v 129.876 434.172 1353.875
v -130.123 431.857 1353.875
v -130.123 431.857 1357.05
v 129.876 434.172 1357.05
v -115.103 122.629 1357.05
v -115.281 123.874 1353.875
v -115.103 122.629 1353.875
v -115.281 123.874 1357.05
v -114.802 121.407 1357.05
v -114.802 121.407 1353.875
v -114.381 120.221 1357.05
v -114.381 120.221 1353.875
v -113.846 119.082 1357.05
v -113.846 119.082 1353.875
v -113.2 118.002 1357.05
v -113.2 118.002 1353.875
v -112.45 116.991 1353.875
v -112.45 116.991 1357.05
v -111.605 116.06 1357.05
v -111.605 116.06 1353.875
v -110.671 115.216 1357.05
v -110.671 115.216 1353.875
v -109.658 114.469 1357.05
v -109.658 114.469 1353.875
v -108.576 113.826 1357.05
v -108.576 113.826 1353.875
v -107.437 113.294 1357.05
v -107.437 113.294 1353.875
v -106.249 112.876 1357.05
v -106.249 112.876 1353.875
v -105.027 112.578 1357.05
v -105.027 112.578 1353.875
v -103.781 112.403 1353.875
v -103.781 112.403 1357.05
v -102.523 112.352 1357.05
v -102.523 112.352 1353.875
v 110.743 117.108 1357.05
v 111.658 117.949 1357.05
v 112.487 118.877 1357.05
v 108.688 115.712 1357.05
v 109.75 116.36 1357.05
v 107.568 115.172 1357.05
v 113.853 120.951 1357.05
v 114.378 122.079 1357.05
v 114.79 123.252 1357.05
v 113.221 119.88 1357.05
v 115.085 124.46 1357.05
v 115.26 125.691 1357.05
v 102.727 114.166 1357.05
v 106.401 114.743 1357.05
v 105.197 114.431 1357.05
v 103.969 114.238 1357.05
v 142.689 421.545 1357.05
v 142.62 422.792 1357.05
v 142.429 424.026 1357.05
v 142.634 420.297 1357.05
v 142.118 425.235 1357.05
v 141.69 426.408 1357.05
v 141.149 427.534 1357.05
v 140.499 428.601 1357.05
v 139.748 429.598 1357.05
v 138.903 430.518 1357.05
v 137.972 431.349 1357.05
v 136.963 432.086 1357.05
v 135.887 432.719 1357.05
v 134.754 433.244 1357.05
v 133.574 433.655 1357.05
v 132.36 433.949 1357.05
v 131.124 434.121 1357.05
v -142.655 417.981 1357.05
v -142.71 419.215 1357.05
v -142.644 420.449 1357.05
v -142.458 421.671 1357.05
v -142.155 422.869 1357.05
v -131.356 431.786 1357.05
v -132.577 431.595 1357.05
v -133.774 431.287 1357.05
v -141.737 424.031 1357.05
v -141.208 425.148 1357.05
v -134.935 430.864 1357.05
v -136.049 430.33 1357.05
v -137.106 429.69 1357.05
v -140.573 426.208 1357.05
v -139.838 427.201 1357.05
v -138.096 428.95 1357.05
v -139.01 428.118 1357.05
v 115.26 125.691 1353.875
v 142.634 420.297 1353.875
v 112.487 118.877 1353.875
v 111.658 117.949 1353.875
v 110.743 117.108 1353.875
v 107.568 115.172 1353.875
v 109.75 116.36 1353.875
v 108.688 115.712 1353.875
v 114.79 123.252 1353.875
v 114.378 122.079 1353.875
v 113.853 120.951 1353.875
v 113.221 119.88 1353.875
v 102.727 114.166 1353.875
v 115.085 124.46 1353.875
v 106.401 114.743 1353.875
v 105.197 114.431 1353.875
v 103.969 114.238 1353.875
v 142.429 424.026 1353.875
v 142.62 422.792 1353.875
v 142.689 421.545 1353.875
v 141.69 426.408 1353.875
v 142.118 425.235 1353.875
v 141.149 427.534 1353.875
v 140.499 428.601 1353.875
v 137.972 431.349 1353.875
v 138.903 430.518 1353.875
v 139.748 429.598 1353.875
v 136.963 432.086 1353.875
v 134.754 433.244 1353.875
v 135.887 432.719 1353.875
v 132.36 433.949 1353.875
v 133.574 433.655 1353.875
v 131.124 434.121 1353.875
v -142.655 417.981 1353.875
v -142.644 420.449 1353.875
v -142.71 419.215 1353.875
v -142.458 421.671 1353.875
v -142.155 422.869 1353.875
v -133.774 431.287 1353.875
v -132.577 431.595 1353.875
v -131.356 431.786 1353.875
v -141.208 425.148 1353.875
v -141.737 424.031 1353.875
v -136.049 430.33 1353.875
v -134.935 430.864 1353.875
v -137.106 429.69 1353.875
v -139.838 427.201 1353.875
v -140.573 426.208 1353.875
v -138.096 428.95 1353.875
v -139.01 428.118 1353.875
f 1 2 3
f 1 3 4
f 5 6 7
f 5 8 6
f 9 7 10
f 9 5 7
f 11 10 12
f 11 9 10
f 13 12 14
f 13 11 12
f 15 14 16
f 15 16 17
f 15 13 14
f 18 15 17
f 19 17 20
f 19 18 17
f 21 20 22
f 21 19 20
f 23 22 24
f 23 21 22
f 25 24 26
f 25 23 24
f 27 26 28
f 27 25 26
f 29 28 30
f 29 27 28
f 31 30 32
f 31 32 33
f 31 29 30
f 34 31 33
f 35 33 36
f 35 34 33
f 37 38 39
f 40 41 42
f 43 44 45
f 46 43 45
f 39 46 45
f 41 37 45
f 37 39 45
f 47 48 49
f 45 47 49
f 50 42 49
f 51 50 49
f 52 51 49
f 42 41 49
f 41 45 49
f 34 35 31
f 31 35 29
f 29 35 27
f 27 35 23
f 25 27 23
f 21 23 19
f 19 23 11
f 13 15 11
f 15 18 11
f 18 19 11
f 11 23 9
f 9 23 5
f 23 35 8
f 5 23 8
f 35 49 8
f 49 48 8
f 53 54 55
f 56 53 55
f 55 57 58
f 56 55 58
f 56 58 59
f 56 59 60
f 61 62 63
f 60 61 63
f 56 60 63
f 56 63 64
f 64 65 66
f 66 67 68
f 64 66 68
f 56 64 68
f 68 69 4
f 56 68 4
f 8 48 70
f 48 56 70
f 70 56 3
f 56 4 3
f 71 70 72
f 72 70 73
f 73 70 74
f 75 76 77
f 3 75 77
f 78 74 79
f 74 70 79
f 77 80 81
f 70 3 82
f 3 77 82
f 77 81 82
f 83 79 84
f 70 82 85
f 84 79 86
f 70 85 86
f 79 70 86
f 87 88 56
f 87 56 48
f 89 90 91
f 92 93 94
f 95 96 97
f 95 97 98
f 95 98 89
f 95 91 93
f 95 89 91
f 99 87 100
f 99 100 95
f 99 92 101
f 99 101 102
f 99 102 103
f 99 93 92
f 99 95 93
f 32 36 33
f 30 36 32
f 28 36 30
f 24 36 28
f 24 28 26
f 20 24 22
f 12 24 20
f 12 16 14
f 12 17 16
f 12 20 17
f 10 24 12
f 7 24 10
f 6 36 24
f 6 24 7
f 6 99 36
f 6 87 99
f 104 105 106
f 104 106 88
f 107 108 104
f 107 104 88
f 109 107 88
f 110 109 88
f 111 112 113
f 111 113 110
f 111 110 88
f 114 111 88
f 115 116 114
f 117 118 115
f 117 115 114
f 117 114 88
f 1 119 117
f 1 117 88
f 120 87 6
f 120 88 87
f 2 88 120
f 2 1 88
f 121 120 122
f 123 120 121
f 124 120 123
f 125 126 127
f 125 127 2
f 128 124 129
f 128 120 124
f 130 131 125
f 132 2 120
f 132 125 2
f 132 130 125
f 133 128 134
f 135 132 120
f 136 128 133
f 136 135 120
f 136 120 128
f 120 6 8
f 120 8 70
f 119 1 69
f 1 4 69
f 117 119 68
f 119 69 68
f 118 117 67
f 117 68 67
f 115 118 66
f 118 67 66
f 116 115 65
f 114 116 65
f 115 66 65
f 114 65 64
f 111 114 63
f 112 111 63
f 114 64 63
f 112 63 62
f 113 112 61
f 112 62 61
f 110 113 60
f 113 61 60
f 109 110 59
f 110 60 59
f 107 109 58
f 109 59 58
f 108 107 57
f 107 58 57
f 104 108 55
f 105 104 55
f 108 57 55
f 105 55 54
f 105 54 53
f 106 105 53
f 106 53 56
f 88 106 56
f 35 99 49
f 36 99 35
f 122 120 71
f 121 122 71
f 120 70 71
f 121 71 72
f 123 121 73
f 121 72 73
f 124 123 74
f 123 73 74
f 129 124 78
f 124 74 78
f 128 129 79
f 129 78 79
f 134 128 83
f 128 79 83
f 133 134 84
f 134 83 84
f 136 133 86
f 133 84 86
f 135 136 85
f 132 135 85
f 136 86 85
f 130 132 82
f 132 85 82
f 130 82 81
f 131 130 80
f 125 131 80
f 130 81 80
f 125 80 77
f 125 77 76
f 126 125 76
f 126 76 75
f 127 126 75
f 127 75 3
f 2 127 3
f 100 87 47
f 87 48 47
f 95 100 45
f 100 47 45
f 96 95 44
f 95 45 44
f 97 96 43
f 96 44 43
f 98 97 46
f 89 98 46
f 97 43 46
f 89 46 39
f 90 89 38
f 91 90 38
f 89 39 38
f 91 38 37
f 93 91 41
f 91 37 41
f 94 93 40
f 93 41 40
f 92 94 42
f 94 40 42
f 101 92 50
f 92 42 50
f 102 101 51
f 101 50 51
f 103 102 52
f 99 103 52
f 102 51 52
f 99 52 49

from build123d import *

# Parameters (mm, degrees)
BOSS_EXTRUDE1_DEPTH = 3.175
FILLET1_R           = 12.7


with BuildPart() as part:
    # Sketch1 → Boss-Extrude1 (new body)
    with BuildSketch(Plane.XY.offset(1353.875334154)):
        Polygon((-114.199047439, 112.248526419), (-143.93508403, 431.734038744), (143.93508403, 434.29668119), (114.199047439, 114.267866307), align=None)
    extrude(amount=BOSS_EXTRUDE1_DEPTH)

    # Fillet1
    fillet1_edges = [part.edges().sort_by_distance(p)[0] for p in [
        (-114.199047439, 112.248526419, 1355.462834154),
        (-143.93508403, 431.734038744, 1355.462834154),
        (143.93508403, 434.29668119, 1355.462834154),
        (114.199047439, 114.267866307, 1355.462834154),
    ]]
    fillet(fillet1_edges, radius=FILLET1_R)


solid = part.part
